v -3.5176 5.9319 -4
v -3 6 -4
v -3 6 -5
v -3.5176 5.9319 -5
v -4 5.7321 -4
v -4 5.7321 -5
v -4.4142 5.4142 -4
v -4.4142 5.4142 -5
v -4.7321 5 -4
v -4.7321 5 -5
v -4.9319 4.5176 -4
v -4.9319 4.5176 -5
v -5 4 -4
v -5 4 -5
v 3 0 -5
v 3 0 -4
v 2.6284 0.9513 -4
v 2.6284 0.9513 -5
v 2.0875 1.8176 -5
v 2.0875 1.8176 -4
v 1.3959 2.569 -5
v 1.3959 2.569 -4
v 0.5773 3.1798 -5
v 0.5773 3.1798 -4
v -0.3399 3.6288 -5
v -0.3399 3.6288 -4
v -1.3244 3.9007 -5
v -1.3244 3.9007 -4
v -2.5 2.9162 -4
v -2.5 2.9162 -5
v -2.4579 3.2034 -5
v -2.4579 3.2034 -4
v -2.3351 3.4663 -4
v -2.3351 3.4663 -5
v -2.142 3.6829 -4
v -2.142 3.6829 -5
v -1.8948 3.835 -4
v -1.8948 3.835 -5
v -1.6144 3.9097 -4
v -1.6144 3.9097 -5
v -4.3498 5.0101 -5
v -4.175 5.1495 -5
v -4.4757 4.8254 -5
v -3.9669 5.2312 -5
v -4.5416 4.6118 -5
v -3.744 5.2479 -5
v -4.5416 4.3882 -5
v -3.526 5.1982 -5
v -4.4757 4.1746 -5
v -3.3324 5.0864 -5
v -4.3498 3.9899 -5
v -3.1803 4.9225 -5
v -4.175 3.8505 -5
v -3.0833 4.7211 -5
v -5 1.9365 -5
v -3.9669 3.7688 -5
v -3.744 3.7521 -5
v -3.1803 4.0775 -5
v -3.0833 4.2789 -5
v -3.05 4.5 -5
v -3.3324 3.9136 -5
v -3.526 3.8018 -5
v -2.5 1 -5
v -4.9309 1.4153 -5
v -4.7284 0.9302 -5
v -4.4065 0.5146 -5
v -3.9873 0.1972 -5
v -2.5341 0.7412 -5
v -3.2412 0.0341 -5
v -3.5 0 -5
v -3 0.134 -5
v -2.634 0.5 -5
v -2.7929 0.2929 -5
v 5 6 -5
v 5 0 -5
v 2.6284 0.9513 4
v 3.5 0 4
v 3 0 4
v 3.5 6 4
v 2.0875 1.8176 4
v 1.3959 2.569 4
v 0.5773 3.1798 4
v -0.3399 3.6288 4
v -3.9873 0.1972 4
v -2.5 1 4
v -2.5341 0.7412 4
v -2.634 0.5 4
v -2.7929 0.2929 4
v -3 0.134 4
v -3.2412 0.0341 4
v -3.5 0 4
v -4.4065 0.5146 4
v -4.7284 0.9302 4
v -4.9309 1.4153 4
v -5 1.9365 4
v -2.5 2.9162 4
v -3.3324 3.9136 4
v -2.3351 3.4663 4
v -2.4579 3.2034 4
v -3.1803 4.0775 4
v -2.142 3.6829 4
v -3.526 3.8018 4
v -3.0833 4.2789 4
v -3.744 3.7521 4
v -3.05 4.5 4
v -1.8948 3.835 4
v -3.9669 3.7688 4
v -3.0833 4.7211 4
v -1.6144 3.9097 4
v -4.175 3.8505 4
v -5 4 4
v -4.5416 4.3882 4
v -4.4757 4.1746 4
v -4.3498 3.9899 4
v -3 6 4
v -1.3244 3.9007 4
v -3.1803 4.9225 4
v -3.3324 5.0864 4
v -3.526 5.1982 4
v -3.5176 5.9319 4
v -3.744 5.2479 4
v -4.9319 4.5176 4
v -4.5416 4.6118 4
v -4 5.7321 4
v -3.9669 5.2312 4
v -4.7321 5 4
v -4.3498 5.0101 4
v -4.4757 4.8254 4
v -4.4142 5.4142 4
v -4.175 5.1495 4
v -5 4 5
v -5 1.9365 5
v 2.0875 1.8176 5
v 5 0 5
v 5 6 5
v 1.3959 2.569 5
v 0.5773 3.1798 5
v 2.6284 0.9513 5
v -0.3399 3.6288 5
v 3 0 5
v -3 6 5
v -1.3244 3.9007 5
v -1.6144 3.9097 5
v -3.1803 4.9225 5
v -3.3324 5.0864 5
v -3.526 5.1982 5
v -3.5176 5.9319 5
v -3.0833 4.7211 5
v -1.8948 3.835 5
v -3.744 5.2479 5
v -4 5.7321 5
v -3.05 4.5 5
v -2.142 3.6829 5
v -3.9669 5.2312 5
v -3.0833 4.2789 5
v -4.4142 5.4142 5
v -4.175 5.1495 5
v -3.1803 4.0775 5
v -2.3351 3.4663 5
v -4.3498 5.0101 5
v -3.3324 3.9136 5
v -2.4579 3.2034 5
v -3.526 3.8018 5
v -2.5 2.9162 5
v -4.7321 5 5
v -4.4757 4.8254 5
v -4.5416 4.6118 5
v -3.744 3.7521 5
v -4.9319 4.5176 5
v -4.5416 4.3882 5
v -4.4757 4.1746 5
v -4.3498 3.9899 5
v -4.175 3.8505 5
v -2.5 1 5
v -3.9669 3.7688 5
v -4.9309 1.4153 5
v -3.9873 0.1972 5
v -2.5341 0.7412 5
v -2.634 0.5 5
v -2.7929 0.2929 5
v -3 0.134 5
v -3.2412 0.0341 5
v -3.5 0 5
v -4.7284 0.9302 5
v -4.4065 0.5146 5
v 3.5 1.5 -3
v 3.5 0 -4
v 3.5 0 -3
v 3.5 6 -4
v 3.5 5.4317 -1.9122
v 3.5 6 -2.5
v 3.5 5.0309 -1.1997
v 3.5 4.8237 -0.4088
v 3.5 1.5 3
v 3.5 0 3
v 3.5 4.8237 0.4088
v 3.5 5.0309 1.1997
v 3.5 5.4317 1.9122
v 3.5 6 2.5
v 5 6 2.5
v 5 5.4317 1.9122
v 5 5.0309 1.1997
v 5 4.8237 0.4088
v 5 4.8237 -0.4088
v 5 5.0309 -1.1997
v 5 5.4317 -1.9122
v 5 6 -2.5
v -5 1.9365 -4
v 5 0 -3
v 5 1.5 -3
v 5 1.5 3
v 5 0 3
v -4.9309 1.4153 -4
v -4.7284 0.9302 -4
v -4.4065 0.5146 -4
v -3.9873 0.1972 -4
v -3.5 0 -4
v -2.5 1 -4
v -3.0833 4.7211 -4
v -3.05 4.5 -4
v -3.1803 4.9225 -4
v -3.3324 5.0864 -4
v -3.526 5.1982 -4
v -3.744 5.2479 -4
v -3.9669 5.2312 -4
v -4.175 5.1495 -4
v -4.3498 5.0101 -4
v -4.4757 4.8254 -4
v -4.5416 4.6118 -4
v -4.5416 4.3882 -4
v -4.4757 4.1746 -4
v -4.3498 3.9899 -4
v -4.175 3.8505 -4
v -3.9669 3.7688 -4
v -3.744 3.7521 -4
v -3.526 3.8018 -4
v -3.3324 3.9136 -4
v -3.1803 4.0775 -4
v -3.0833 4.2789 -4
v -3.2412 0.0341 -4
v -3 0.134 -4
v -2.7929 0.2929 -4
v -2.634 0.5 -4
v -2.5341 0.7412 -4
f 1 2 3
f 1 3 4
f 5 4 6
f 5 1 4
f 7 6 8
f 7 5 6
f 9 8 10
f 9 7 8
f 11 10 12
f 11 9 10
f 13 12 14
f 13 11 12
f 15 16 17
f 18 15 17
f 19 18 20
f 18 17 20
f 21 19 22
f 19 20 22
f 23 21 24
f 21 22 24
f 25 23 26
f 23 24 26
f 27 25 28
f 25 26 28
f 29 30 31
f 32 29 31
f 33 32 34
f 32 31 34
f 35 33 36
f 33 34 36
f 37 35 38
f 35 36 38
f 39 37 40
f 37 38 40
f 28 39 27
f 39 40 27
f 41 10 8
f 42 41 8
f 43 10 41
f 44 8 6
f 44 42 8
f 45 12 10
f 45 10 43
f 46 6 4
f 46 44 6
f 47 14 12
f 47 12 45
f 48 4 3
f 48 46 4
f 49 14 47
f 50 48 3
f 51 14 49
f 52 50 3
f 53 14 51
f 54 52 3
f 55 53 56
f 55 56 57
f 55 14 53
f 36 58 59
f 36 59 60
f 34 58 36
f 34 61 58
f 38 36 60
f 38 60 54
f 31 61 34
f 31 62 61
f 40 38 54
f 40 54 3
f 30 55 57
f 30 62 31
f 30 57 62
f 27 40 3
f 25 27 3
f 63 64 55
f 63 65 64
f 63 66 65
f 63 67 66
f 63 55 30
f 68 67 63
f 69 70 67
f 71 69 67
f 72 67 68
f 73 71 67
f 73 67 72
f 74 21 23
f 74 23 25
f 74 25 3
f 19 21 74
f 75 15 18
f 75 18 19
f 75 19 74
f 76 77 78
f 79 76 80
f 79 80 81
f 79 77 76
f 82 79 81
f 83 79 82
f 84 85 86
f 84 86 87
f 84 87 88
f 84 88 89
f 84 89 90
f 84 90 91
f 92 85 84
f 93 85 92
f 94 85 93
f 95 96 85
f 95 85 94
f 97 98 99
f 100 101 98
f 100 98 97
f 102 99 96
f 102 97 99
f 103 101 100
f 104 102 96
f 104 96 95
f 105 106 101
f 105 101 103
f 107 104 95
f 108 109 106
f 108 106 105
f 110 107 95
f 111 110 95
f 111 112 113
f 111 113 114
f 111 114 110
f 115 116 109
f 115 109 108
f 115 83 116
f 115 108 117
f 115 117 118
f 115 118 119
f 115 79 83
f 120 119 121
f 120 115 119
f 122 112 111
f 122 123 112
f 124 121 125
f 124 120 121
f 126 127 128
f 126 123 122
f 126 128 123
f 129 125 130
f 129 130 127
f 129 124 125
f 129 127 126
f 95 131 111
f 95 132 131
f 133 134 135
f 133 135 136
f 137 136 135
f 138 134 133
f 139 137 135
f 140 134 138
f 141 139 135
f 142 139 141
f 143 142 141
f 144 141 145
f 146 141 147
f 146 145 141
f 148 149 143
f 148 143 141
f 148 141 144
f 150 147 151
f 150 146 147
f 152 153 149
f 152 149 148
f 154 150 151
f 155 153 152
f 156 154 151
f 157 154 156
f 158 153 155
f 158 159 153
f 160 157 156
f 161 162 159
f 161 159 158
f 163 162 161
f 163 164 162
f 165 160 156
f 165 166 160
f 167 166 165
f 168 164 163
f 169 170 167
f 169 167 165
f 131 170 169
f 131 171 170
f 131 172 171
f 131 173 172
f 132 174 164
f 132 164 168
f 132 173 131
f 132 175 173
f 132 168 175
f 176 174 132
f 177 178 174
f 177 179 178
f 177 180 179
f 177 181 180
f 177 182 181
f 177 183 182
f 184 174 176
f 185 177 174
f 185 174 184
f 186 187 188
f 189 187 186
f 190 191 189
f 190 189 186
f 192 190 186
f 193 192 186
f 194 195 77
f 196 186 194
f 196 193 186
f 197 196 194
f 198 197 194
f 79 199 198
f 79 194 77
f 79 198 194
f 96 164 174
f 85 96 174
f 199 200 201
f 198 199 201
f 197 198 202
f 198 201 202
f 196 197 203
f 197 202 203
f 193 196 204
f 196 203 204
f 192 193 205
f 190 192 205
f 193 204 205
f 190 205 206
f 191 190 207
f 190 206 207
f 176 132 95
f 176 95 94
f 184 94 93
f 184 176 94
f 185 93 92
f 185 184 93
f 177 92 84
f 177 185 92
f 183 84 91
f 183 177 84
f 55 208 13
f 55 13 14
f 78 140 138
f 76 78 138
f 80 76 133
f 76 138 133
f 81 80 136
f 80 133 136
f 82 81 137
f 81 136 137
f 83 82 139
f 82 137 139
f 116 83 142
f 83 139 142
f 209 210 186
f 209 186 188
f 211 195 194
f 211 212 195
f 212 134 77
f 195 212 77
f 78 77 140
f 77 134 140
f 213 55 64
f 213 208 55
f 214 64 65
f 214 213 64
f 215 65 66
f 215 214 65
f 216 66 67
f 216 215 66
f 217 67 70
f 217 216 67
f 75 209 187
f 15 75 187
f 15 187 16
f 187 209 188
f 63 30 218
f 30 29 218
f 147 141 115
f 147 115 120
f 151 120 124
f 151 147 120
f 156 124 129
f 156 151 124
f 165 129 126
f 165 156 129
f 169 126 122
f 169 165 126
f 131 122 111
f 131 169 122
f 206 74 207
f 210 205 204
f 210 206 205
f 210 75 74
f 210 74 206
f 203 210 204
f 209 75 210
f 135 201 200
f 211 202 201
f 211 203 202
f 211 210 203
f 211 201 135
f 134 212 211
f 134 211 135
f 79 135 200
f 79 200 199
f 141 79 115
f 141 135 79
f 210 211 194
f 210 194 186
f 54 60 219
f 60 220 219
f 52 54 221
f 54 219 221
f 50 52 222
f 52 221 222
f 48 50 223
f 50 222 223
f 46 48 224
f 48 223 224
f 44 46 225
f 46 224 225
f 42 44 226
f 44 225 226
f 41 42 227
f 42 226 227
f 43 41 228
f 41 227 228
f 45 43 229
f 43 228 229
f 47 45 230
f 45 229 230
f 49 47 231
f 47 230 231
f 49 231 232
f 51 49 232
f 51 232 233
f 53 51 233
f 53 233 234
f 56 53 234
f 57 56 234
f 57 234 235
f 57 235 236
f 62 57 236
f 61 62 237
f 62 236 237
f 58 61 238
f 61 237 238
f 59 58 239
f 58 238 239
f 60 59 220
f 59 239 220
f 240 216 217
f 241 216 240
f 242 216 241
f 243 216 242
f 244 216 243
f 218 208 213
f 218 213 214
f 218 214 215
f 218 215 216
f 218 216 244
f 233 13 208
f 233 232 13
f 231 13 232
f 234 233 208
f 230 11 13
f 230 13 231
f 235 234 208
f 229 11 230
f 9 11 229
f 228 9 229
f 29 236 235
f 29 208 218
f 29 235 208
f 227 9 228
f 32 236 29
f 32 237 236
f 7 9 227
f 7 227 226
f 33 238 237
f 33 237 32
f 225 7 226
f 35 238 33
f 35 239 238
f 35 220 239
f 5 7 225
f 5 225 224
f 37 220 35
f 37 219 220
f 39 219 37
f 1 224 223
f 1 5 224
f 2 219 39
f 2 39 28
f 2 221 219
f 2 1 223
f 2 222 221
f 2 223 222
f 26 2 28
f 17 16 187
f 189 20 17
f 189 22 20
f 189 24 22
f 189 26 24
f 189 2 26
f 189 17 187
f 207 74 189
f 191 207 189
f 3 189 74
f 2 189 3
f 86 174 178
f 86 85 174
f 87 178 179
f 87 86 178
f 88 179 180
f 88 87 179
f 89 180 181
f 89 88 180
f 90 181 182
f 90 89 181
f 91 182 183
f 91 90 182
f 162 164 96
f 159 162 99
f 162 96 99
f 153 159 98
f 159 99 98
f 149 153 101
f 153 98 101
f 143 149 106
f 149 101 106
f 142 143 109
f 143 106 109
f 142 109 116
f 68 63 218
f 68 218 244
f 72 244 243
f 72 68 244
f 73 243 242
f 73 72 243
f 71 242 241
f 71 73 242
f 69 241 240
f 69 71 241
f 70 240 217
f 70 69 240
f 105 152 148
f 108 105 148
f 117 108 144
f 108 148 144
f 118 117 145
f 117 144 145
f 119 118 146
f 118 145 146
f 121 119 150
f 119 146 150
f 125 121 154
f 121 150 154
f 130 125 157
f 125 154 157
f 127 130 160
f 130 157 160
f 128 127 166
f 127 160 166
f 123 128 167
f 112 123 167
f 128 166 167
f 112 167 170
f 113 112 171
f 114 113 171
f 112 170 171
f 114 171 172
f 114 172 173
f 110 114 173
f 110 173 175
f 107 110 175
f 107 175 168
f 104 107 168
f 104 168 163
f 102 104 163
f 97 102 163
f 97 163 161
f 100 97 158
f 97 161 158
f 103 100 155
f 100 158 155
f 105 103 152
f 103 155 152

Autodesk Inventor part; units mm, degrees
ref_plane "YZ Plane" through (0, 0, 0) normal (1, 0, 0) x (0, 1, 0)
ref_plane "XZ Plane" through (0, 0, 0) normal (0, 1, 0) x (-1, 0, 0)
ref_plane "XY Plane" through (0, 0, 0) normal (0, 0, 1) x (1, 0, 0)
sketch "Esboço1" plane through (0, 0, 0) normal (0, 1, 0) x (-1, 0, 0)
  line L0 (-5, 5) -> (5, 5)
  line L1 (5, 5) -> (5, -5)
  line L2 (5, -5) -> (-5, -5)
  line L3 (-5, -5) -> (-5, 5)
  line L4 (-5, 5) -> (5, -5) construction
  line L5 (5, 5) -> (-5, -5) construction
  point P0 (0, 0)
  dimension "d0" = 10
  dimension "d1" = 10
extrude "Extrusão1" add sketch "Esboço1" along normal blind 6
sketch "Esboço2" plane through (5, 0, 5) normal (1, 0, 0) x (0, 0, -1)
  line L0 (2, 0) -> (2, 1.5)
  line L1 (0, 0) -> (0, 6) projected
  line L2 (2, 1.5) -> (8, 1.5)
  line L3 (8, 1.5) -> (8, 0)
  line L4 (10, 0) -> (10, 6) projected
  line L5 (0, 0) -> (10, 0) projected
  point P0 (5, 0)
  dimension "d4" = 2
  dimension "d5" = 1.5
  dimension "d6" = 2
  dimension "d7" = 1.5
extrude "Extrusão2" cut sketch "Esboço2" against normal through all
sketch "Esboço3" plane through (-5, 0, 5) normal (0, 0, 1) x (1, 0, 0)
  line L0 (10, 0) -> (0, 0) projected
  arc A0 (8, 0) -> (2.5, 3.9823) centre (2.7087, -1.5186) ccw
  line L1 (0, 0) -> (0, 6) projected
  line L2 (2.5, 3.9823) -> (2.5, 0)
  point P0 (5, 0)
  dimension "d10" = 2
  dimension "d11" = 2.5
  dimension "d12" = 5.5049
  dimension "d13" = 2.7087
extrude "Extrusão3" cut sketch "Esboço3" against normal through all
sketch "Esboço4" plane through (-5, 6, 5) normal (0, 0, 1) x (1, 0, 0)
  point P0 (5, -6)
fillet "Arredondamento1" radius 1 1 edges at (-2.5, 3.9823, 0)
fillet "Arredondamento2" radius 1 2 edges at (-2.5, 0, 4) (-2.5, 0, -4)
fillet "Arredondamento3" radius 2 3 edges at (-5, 6, 0) (-5, 0, -4) (-5, 0, 4)
sketch "Esboço5" plane through (5, 0, 5) normal (0, 0, 1) x (1, 0, 0)
  circle A0 centre (-8.8, 4.5) radius 0.75
  line L0 (0, 0) -> (0, 6) projected
  point P0 (-5, 0)
  dimension "d19" = 1.5
  dimension "d20" = 8.8
  dimension "d21" = 4.5
extrude "Extrusão4" cut sketch "Esboço5" against normal through all
sketch "Esboço6" plane through (0, 6, 0) normal (0, 1, 0) x (1, 0, 0)
  line L0 (-5, 5) -> (-5, -5) projected
  line L1 (-5, 4) -> (3.5, 4)
  line L2 (5, -5) -> (5, 5) projected
  line L3 (3.5, -4) -> (-5, -4)
  line L4 (-5, -4) -> (-5, 4)
  line L5 (5, 5) -> (-3, 5) projected
  line L6 (-3, -5) -> (5, -5) projected
  line L7 (3.5, 4) -> (3.5, -4)
  point P0 (0, 0)
  dimension "d24" = 1
  dimension "d25" = 1
  dimension "d26" = 1.5
extrude "Extrusão5" cut sketch "Esboço6" against normal through all
sketch "Esboço7" plane through (5, 0, -5) normal (1, 0, 0) x (0, 0, -1)
  line L0 (-1, 6) -> (-9, 6) projected
  arc A0 (-7.5, 6) -> (-2.5, 6) centre (-5, 7.9975) ccw
  line L1 (-10, 0) -> (-10, 6) projected
  line L2 (0, 0) -> (0, 6) projected
  point P0 (-5, 0)
  dimension "d29" = 3.2
  dimension "d30" = 2.5
  dimension "d31" = 2.5
extrude "Extrusão6" cut sketch "Esboço7" against normal blind 6
properties material "Liga de Nickel-Copper 400"
